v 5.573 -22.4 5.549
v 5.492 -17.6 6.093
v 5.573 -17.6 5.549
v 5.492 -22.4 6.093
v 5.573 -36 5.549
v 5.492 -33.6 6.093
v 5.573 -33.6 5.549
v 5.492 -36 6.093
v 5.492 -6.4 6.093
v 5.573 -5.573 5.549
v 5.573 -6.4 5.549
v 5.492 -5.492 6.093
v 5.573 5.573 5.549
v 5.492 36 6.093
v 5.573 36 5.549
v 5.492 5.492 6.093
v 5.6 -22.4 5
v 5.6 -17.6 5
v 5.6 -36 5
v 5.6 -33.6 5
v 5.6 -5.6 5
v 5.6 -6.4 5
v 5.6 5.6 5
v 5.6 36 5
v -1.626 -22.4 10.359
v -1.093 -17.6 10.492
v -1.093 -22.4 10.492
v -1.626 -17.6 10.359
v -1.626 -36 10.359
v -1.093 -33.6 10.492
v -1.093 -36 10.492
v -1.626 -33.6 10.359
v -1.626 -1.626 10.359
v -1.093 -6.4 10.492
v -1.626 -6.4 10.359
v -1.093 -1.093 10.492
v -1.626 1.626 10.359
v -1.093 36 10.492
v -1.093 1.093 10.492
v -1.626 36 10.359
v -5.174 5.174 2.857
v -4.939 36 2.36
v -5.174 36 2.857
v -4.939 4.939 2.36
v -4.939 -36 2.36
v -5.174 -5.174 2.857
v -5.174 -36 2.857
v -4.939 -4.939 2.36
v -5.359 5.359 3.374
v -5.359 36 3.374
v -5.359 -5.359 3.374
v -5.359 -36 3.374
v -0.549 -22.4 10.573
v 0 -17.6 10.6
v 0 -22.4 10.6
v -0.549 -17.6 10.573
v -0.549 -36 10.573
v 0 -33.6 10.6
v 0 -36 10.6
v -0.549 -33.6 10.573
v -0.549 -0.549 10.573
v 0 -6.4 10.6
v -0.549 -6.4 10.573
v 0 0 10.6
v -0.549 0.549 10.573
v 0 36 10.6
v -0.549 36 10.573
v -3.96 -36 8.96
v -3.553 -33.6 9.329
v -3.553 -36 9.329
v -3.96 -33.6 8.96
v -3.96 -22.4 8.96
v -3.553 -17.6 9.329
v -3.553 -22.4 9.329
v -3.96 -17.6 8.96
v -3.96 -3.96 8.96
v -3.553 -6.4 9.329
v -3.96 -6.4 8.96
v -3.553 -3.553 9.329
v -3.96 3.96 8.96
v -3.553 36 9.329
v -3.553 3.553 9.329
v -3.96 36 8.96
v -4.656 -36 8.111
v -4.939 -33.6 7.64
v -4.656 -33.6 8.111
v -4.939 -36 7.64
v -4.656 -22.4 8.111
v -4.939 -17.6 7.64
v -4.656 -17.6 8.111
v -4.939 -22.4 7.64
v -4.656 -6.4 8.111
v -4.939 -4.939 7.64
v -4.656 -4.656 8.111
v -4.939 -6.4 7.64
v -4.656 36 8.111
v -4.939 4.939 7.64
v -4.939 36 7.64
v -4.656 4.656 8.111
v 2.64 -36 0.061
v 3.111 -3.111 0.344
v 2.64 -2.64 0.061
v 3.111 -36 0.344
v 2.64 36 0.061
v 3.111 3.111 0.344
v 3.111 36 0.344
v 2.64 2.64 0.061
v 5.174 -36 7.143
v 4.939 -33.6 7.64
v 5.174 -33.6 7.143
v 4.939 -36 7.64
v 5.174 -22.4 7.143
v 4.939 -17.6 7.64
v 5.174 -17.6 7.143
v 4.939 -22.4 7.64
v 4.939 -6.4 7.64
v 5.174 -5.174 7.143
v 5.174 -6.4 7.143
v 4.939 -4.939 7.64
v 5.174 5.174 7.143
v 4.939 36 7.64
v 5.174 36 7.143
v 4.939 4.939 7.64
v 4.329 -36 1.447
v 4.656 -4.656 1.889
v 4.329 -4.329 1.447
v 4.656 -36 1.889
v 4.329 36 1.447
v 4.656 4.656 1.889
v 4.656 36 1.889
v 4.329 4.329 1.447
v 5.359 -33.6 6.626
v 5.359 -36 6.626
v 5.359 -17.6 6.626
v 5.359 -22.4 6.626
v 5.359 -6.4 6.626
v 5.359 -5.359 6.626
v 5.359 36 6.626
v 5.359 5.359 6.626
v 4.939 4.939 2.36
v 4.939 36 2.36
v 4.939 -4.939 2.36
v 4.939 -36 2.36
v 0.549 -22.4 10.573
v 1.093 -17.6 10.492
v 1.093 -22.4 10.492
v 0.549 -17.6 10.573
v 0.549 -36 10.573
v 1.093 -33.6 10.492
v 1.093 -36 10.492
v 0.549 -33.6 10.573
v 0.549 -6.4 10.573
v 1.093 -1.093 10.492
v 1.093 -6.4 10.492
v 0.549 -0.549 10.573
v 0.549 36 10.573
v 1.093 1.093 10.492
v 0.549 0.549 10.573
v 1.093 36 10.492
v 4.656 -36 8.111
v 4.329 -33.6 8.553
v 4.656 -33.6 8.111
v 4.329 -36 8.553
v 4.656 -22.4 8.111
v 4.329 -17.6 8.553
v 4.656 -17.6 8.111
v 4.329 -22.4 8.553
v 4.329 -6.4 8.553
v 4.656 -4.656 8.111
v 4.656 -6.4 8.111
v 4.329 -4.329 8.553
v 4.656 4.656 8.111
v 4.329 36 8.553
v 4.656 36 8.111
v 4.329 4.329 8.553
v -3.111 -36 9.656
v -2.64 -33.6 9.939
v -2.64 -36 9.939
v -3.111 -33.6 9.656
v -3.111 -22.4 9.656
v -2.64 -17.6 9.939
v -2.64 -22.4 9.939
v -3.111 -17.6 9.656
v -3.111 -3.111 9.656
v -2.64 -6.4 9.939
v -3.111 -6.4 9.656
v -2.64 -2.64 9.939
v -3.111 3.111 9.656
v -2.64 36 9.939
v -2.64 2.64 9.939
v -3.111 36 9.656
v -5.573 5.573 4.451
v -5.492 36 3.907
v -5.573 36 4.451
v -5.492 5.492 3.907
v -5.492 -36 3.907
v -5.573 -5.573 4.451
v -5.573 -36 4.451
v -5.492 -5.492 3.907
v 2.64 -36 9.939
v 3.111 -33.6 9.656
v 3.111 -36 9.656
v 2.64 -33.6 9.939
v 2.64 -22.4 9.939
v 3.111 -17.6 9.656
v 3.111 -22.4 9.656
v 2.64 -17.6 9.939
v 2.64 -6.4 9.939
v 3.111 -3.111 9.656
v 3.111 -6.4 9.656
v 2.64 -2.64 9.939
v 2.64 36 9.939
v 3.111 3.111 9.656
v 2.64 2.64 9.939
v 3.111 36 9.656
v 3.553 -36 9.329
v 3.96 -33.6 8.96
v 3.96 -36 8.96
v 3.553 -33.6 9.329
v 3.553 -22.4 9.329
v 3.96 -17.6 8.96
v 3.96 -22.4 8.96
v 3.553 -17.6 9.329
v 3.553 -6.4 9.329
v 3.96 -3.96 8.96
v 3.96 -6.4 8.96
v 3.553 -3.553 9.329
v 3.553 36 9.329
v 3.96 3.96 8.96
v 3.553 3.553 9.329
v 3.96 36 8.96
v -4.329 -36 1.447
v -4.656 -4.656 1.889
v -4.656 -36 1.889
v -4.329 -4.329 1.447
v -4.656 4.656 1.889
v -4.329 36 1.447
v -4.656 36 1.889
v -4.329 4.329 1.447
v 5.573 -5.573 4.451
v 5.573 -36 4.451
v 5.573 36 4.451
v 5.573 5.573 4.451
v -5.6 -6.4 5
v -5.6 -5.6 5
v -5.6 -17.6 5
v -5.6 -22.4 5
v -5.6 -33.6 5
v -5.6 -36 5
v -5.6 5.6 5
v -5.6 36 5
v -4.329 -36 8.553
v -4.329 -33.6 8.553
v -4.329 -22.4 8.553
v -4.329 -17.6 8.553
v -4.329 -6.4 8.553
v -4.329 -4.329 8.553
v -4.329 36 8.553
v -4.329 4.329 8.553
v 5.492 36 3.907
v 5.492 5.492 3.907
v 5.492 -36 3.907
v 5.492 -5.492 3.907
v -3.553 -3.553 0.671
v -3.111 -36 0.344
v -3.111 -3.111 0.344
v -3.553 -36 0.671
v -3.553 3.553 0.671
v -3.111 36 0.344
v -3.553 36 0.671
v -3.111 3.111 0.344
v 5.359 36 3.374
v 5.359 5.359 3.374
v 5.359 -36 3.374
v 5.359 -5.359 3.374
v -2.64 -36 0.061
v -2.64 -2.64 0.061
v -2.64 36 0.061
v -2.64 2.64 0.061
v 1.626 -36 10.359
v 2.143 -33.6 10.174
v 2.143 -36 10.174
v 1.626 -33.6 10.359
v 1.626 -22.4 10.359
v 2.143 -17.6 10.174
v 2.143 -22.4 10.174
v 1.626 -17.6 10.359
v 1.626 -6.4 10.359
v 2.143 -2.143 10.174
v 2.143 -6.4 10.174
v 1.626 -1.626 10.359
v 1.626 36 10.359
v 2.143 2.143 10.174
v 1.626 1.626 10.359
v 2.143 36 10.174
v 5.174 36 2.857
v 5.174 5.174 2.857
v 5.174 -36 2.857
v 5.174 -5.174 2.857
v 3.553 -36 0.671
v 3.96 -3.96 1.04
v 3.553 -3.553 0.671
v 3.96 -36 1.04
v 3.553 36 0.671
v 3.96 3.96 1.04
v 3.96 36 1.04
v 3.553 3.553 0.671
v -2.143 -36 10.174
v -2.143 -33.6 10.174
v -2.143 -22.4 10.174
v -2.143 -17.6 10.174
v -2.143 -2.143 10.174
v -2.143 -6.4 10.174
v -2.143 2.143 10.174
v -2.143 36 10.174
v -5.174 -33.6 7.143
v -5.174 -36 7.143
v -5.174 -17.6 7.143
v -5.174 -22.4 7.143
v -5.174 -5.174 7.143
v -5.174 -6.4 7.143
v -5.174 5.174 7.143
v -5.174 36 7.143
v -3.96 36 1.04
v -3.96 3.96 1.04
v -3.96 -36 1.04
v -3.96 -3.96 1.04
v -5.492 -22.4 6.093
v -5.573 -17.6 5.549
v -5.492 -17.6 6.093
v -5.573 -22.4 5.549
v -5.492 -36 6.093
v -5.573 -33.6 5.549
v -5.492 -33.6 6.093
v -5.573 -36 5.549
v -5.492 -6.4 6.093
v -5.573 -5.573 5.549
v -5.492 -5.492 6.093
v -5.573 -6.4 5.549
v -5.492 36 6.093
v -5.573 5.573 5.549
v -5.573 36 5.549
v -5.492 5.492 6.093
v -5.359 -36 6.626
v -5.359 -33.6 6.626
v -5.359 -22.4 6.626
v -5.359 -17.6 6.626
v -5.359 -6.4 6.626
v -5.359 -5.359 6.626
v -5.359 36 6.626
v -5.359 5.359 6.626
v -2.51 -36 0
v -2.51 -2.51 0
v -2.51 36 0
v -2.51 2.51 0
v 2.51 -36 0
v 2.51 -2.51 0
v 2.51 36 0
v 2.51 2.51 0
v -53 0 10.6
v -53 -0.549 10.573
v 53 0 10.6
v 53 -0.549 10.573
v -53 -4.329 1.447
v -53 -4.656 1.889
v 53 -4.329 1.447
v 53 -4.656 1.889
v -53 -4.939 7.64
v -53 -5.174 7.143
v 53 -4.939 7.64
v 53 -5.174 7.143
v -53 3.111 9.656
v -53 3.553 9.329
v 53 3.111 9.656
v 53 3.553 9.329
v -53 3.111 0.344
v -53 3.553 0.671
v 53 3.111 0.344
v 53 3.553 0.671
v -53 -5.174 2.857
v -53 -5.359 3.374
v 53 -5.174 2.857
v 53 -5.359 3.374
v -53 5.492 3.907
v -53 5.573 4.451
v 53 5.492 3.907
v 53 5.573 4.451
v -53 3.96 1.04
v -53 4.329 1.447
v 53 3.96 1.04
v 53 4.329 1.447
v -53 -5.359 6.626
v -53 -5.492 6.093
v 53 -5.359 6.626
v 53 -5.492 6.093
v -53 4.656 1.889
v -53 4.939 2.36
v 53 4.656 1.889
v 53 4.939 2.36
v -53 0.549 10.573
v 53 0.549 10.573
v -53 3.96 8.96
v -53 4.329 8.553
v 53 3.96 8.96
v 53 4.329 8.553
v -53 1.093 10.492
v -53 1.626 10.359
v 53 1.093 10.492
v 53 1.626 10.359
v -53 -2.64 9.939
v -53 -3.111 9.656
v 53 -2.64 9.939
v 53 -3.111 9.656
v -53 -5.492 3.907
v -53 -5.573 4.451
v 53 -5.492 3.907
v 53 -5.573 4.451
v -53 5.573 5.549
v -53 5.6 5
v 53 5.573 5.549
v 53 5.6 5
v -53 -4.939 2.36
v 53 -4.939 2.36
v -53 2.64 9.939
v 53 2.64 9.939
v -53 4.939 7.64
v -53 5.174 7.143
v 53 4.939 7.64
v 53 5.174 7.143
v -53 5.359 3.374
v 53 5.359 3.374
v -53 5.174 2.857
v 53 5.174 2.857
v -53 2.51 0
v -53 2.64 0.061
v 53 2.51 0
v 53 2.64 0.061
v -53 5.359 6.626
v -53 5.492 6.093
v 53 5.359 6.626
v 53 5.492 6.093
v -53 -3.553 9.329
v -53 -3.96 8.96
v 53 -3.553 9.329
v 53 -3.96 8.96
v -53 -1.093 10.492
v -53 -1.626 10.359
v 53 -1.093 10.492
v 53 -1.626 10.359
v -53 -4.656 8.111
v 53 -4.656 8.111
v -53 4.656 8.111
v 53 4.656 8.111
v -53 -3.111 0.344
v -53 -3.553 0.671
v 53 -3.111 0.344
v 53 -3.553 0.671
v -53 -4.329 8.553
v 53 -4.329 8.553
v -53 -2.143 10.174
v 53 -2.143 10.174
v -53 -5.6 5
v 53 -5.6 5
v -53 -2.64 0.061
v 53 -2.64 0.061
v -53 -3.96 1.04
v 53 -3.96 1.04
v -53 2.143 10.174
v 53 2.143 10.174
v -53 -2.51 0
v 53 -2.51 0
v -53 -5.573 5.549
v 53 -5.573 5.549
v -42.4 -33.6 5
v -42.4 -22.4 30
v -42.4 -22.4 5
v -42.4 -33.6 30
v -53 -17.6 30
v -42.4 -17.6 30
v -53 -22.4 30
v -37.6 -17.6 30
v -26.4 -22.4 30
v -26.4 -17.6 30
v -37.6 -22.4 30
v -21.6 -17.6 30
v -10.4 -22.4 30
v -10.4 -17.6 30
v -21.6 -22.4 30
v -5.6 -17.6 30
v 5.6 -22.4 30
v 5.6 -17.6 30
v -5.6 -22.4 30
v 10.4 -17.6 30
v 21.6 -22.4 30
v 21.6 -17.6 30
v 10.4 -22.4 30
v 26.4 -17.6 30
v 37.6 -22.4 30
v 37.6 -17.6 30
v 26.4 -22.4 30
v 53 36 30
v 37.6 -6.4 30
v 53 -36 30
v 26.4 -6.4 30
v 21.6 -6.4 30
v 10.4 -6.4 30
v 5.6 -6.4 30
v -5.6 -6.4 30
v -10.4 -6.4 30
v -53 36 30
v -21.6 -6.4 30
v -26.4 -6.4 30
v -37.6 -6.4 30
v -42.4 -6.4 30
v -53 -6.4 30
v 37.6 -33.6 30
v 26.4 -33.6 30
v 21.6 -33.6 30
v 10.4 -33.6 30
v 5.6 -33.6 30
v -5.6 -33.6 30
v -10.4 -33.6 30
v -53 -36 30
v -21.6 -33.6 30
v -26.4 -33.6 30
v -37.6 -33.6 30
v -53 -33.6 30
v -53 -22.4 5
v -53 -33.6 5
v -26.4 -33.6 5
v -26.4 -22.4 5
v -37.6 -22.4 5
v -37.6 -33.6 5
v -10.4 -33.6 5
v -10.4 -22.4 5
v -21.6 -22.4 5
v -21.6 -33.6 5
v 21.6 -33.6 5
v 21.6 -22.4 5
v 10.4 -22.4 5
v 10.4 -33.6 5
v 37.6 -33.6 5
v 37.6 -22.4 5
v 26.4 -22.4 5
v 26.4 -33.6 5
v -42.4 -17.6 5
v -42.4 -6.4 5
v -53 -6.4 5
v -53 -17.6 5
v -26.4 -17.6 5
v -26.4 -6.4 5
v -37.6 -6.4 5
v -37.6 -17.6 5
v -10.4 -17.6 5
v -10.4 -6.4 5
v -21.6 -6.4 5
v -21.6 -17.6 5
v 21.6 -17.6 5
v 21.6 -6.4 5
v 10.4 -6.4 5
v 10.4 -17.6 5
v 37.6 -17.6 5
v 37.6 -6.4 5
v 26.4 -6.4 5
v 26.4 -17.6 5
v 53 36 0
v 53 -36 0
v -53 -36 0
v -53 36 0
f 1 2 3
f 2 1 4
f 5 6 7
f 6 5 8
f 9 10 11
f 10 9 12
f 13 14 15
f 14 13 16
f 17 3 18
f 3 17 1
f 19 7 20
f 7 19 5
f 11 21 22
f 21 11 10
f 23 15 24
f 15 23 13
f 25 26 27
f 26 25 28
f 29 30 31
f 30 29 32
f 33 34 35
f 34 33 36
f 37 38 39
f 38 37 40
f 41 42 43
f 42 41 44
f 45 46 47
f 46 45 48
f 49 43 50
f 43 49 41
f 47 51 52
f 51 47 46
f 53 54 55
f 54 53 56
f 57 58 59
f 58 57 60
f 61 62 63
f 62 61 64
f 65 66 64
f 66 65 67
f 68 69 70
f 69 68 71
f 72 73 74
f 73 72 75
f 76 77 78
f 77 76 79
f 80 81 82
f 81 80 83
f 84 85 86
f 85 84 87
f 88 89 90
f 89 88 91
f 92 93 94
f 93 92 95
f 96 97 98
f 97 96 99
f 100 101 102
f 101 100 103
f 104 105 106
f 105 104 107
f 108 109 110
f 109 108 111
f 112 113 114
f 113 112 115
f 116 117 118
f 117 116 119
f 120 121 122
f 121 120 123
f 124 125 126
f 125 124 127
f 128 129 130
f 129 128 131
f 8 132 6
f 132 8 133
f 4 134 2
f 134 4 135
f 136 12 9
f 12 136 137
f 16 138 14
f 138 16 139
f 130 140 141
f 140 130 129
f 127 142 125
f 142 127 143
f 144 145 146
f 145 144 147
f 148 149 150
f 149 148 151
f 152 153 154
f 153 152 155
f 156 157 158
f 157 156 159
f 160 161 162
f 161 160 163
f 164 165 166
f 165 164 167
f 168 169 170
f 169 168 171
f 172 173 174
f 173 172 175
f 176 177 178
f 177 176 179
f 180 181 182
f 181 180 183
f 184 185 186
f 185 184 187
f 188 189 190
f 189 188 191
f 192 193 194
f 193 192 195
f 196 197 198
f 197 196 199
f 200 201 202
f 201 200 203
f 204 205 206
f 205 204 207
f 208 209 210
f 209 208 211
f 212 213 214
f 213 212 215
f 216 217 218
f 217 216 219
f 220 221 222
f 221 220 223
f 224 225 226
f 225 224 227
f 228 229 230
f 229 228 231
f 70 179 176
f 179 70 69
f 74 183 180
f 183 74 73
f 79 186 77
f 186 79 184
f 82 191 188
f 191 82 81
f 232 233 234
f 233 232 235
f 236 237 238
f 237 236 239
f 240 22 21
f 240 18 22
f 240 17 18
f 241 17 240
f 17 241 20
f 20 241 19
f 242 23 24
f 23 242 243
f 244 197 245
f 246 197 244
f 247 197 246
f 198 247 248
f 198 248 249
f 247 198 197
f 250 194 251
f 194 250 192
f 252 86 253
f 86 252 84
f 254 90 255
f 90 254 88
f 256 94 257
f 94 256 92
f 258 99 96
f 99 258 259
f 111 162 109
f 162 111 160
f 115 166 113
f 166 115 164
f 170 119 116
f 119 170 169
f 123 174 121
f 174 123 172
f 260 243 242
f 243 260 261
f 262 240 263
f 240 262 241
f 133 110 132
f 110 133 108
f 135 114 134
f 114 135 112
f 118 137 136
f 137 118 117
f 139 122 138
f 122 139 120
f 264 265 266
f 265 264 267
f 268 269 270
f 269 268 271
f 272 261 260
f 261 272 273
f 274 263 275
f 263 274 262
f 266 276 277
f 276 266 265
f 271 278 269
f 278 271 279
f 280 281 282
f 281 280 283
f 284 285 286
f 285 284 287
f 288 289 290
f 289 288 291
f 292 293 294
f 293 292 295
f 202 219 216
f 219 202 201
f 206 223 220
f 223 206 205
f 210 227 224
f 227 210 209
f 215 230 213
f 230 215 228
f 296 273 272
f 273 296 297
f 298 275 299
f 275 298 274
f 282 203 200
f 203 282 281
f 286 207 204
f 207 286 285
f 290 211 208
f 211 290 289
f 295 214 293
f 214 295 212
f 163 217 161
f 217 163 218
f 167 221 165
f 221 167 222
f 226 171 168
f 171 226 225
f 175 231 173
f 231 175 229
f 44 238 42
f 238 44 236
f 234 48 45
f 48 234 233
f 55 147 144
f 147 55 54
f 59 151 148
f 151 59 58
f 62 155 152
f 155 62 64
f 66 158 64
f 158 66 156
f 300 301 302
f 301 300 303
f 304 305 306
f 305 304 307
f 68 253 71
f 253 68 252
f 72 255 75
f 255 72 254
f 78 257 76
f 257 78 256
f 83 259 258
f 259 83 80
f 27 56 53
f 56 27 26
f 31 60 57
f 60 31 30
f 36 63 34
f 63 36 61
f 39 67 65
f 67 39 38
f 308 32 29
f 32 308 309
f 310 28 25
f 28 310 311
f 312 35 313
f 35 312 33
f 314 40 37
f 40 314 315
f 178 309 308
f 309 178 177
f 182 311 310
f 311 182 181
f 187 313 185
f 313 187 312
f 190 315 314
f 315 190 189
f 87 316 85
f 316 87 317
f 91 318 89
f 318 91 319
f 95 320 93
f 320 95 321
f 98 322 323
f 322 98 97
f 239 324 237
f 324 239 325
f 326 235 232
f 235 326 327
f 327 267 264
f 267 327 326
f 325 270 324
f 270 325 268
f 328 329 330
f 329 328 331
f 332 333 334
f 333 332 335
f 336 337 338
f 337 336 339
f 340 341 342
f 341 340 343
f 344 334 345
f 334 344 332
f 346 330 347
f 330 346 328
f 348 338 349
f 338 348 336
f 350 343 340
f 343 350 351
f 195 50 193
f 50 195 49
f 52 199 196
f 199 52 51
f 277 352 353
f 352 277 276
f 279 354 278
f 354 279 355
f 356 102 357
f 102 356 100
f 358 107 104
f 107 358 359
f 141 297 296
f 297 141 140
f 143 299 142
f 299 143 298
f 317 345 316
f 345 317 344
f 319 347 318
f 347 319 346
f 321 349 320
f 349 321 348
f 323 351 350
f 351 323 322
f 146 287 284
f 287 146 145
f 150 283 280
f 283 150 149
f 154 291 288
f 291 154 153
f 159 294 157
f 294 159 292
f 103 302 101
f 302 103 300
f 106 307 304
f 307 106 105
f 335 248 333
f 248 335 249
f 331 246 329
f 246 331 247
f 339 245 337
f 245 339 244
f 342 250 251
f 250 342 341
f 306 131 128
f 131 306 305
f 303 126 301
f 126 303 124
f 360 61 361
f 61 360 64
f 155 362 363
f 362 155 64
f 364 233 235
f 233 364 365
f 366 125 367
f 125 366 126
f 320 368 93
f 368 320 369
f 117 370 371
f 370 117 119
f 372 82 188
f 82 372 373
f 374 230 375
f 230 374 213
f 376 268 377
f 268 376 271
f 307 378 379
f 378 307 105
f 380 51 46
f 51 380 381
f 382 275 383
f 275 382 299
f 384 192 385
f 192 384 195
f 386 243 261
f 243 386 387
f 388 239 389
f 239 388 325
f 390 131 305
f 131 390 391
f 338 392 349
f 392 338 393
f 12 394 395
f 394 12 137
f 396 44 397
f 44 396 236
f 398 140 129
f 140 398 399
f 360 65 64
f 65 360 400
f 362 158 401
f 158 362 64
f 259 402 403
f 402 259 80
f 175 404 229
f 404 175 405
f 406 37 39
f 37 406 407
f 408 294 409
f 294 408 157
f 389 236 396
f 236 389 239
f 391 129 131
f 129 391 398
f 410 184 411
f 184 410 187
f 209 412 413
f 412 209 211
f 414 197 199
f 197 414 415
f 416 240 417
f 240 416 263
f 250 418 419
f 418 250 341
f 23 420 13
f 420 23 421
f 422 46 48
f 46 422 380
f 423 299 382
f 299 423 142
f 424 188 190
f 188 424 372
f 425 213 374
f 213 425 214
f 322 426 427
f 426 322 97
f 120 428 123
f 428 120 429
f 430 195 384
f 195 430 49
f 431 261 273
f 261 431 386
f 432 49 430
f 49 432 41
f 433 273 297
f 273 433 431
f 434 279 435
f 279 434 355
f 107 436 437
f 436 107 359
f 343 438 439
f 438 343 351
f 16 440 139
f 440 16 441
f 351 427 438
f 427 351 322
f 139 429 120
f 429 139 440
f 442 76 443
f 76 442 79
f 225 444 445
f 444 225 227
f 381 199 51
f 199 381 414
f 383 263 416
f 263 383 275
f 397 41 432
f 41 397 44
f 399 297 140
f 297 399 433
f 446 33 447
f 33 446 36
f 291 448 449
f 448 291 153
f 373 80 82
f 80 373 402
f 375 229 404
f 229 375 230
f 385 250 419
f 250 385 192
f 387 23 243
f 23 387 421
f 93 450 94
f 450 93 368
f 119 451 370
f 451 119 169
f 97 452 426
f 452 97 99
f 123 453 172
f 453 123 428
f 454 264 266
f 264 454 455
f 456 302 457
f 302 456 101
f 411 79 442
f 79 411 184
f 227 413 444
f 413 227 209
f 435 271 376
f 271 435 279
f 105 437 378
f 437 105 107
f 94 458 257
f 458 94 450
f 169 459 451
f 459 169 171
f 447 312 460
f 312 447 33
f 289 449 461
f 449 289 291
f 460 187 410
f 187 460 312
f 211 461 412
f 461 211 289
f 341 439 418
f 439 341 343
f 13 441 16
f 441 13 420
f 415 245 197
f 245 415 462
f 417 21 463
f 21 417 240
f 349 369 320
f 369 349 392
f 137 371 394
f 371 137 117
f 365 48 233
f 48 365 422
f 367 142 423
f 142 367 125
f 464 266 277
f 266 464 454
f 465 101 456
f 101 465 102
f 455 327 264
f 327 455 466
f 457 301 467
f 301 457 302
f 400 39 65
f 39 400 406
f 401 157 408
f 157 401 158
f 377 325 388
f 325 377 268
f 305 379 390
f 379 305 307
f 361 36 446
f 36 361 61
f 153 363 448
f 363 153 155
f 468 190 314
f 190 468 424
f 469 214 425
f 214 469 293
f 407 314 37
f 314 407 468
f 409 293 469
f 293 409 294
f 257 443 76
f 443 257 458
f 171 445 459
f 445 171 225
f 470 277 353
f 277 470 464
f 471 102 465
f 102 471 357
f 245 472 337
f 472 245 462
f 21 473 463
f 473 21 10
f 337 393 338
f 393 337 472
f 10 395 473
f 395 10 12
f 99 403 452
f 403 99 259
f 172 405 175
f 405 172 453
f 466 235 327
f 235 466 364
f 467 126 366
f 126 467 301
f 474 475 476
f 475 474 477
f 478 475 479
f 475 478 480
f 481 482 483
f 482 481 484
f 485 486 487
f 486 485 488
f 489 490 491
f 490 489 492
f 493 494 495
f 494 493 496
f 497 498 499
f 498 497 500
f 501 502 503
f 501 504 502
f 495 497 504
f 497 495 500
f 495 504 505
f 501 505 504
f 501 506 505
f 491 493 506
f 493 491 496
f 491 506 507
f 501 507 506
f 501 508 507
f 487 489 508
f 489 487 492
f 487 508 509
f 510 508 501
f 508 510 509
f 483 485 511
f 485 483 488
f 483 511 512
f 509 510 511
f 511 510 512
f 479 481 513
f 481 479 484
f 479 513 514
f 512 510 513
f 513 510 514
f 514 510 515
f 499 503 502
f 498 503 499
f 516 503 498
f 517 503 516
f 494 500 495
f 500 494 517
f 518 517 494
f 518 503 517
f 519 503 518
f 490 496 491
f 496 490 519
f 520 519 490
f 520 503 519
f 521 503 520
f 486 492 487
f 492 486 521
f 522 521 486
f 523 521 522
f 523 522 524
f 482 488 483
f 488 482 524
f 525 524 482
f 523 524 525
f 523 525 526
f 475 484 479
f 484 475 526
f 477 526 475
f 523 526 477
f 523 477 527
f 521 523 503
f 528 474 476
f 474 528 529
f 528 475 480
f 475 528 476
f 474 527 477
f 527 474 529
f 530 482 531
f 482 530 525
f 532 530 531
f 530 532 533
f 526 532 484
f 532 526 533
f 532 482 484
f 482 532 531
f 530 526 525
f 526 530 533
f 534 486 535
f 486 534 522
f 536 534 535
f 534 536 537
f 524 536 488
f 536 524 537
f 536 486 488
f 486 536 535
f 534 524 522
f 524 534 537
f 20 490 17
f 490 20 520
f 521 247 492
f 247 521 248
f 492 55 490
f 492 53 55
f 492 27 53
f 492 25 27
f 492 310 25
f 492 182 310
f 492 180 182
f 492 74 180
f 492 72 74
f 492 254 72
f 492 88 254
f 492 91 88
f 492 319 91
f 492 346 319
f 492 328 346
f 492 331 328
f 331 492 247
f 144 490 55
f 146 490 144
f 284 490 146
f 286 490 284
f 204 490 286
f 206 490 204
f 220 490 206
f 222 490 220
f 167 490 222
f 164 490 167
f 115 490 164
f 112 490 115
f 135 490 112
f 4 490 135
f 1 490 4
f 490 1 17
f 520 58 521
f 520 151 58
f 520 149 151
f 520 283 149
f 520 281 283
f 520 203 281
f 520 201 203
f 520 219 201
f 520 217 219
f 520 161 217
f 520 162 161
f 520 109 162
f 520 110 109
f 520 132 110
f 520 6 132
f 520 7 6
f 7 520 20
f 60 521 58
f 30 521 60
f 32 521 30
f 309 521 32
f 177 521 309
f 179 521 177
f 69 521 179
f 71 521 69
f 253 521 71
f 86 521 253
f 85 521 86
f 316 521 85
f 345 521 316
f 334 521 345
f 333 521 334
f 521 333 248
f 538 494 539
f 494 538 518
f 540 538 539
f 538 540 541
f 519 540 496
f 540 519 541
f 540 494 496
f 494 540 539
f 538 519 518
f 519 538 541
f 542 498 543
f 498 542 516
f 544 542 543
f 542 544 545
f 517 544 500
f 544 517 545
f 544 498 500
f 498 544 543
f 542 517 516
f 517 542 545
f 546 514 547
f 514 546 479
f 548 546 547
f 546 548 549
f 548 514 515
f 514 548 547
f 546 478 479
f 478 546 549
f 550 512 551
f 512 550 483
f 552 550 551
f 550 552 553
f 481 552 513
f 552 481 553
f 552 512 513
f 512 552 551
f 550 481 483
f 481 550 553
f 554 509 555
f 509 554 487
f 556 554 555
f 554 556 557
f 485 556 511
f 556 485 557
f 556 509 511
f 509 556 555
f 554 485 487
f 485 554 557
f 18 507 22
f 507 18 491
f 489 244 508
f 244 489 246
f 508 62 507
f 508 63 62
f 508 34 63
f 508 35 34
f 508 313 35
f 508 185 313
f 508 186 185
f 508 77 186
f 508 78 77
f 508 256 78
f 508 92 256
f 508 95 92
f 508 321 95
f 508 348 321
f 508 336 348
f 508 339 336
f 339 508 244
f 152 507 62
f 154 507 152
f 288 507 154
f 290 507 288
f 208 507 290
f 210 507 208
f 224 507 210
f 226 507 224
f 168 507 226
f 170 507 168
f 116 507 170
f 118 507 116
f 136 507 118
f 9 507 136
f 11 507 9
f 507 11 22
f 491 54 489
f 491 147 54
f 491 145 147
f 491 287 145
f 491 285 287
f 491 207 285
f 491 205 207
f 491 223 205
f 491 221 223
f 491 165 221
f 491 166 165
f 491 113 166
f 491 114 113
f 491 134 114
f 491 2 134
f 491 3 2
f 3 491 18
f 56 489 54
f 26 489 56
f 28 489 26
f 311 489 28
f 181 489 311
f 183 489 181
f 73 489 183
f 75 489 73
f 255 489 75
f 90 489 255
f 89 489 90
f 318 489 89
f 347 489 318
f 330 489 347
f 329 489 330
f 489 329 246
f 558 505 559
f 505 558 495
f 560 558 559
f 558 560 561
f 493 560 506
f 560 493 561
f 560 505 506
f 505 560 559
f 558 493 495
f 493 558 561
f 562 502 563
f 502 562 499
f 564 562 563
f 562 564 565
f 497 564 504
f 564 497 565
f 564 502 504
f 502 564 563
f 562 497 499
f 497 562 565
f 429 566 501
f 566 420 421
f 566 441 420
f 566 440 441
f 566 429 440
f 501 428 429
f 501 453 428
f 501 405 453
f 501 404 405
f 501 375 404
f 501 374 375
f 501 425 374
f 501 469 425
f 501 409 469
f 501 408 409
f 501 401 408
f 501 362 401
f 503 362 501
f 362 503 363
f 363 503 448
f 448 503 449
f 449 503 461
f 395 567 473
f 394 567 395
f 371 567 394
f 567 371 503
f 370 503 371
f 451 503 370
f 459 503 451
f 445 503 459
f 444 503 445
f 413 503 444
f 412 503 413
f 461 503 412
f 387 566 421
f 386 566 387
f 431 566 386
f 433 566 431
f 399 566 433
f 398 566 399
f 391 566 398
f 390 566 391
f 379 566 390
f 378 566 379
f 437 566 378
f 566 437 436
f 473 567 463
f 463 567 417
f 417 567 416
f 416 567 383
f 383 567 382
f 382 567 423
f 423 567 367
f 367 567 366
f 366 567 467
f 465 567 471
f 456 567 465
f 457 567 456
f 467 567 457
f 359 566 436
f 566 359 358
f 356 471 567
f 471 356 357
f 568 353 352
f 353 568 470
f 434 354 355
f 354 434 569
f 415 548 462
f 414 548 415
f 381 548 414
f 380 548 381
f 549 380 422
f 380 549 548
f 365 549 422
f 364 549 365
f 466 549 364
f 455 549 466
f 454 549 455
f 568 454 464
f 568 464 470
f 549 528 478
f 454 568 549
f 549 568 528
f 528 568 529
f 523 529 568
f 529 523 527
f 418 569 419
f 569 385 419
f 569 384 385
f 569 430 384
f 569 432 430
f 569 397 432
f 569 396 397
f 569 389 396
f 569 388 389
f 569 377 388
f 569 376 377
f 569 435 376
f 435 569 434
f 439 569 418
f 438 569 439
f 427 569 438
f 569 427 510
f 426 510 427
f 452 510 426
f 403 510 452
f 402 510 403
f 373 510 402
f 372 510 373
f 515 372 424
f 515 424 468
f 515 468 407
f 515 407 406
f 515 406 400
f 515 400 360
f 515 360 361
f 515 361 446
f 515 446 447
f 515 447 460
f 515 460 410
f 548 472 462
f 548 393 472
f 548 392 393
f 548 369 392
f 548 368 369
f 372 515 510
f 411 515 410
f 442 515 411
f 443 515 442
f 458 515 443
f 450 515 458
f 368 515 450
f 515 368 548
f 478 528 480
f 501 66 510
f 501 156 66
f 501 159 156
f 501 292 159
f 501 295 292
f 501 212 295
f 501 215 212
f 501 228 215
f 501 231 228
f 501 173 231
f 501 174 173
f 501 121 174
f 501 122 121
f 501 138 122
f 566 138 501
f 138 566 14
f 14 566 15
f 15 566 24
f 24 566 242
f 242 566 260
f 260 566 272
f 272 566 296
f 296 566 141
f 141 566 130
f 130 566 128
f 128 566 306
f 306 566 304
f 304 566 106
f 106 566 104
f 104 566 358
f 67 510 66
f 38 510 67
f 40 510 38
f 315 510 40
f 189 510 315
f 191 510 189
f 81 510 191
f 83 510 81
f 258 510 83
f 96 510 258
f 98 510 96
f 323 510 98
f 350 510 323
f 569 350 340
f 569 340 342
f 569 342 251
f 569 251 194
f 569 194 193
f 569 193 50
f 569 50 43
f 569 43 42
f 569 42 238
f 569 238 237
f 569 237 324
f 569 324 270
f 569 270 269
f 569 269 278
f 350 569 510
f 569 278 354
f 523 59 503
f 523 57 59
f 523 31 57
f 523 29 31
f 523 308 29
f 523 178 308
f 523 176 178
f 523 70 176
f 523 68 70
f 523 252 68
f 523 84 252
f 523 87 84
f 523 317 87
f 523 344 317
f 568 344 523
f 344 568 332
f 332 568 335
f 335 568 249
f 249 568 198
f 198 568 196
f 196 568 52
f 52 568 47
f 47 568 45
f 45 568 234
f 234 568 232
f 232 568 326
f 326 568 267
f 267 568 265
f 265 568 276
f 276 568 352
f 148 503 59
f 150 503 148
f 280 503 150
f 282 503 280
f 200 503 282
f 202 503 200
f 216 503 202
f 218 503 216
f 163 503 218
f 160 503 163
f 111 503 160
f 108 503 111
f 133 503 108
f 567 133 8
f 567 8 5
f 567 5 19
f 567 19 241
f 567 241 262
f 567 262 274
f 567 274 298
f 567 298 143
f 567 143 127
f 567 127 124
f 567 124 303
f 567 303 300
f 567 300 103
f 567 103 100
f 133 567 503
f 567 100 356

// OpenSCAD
// Built by bench/smallmodels/features/compiler.py from a list of features.
$fn = 64;
difference() {
  union() {
    translate([0, 0, 0]) translate([-53, -36, 0]) cube([106, 72, 30]);
  }
  union() {
    translate([0, 0, 5]) rotate([0, 0, 0]) rotate([90, 0, 0]) cylinder(d = 11.2, h = 1120, center = true);
    translate([0, 0, 5]) rotate([0, 0, 0]) rotate([0, 90, 0]) cylinder(d = 11.2, h = 1120, center = true);
    translate([-48, -60, 5]) rotate([0, 0, 0]) translate([-5.6, -5.6, 0]) cube([11.2, 11.2, 25]);
    translate([-32, -60, 5]) rotate([0, 0, 0]) translate([-5.6, -5.6, 0]) cube([11.2, 11.2, 25]);
    translate([-16, -60, 5]) rotate([0, 0, 0]) translate([-5.6, -5.6, 0]) cube([11.2, 11.2, 25]);
    translate([0, -60, 5]) rotate([0, 0, 0]) translate([-5.6, -5.6, 0]) cube([11.2, 11.2, 25]);
    translate([16, -60, 5]) rotate([0, 0, 0]) translate([-5.6, -5.6, 0]) cube([11.2, 11.2, 25]);
    translate([32, -60, 5]) rotate([0, 0, 0]) translate([-5.6, -5.6, 0]) cube([11.2, 11.2, 25]);
    translate([-48, -44, 5]) rotate([0, 0, 0]) translate([-5.6, -5.6, 0]) cube([11.2, 11.2, 25]);
    translate([-32, -44, 5]) rotate([0, 0, 0]) translate([-5.6, -5.6, 0]) cube([11.2, 11.2, 25]);
    translate([-16, -44, 5]) rotate([0, 0, 0]) translate([-5.6, -5.6, 0]) cube([11.2, 11.2, 25]);
    translate([0, -44, 5]) rotate([0, 0, 0]) translate([-5.6, -5.6, 0]) cube([11.2, 11.2, 25]);
    translate([16, -44, 5]) rotate([0, 0, 0]) translate([-5.6, -5.6, 0]) cube([11.2, 11.2, 25]);
    translate([32, -44, 5]) rotate([0, 0, 0]) translate([-5.6, -5.6, 0]) cube([11.2, 11.2, 25]);
    translate([-48, -28, 5]) rotate([0, 0, 0]) translate([-5.6, -5.6, 0]) cube([11.2, 11.2, 25]);
    translate([-32, -28, 5]) rotate([0, 0, 0]) translate([-5.6, -5.6, 0]) cube([11.2, 11.2, 25]);
    translate([-16, -28, 5]) rotate([0, 0, 0]) translate([-5.6, -5.6, 0]) cube([11.2, 11.2, 25]);
    translate([0, -28, 5]) rotate([0, 0, 0]) translate([-5.6, -5.6, 0]) cube([11.2, 11.2, 25]);
    translate([16, -28, 5]) rotate([0, 0, 0]) translate([-5.6, -5.6, 0]) cube([11.2, 11.2, 25]);
    translate([32, -28, 5]) rotate([0, 0, 0]) translate([-5.6, -5.6, 0]) cube([11.2, 11.2, 25]);
    translate([-48, -12, 5]) rotate([0, 0, 0]) translate([-5.6, -5.6, 0]) cube([11.2, 11.2, 25]);
    translate([-32, -12, 5]) rotate([0, 0, 0]) translate([-5.6, -5.6, 0]) cube([11.2, 11.2, 25]);
    translate([-16, -12, 5]) rotate([0, 0, 0]) translate([-5.6, -5.6, 0]) cube([11.2, 11.2, 25]);
    translate([0, -12, 5]) rotate([0, 0, 0]) translate([-5.6, -5.6, 0]) cube([11.2, 11.2, 25]);
    translate([16, -12, 5]) rotate([0, 0, 0]) translate([-5.6, -5.6, 0]) cube([11.2, 11.2, 25]);
    translate([32, -12, 5]) rotate([0, 0, 0]) translate([-5.6, -5.6, 0]) cube([11.2, 11.2, 25]);
  }
}
